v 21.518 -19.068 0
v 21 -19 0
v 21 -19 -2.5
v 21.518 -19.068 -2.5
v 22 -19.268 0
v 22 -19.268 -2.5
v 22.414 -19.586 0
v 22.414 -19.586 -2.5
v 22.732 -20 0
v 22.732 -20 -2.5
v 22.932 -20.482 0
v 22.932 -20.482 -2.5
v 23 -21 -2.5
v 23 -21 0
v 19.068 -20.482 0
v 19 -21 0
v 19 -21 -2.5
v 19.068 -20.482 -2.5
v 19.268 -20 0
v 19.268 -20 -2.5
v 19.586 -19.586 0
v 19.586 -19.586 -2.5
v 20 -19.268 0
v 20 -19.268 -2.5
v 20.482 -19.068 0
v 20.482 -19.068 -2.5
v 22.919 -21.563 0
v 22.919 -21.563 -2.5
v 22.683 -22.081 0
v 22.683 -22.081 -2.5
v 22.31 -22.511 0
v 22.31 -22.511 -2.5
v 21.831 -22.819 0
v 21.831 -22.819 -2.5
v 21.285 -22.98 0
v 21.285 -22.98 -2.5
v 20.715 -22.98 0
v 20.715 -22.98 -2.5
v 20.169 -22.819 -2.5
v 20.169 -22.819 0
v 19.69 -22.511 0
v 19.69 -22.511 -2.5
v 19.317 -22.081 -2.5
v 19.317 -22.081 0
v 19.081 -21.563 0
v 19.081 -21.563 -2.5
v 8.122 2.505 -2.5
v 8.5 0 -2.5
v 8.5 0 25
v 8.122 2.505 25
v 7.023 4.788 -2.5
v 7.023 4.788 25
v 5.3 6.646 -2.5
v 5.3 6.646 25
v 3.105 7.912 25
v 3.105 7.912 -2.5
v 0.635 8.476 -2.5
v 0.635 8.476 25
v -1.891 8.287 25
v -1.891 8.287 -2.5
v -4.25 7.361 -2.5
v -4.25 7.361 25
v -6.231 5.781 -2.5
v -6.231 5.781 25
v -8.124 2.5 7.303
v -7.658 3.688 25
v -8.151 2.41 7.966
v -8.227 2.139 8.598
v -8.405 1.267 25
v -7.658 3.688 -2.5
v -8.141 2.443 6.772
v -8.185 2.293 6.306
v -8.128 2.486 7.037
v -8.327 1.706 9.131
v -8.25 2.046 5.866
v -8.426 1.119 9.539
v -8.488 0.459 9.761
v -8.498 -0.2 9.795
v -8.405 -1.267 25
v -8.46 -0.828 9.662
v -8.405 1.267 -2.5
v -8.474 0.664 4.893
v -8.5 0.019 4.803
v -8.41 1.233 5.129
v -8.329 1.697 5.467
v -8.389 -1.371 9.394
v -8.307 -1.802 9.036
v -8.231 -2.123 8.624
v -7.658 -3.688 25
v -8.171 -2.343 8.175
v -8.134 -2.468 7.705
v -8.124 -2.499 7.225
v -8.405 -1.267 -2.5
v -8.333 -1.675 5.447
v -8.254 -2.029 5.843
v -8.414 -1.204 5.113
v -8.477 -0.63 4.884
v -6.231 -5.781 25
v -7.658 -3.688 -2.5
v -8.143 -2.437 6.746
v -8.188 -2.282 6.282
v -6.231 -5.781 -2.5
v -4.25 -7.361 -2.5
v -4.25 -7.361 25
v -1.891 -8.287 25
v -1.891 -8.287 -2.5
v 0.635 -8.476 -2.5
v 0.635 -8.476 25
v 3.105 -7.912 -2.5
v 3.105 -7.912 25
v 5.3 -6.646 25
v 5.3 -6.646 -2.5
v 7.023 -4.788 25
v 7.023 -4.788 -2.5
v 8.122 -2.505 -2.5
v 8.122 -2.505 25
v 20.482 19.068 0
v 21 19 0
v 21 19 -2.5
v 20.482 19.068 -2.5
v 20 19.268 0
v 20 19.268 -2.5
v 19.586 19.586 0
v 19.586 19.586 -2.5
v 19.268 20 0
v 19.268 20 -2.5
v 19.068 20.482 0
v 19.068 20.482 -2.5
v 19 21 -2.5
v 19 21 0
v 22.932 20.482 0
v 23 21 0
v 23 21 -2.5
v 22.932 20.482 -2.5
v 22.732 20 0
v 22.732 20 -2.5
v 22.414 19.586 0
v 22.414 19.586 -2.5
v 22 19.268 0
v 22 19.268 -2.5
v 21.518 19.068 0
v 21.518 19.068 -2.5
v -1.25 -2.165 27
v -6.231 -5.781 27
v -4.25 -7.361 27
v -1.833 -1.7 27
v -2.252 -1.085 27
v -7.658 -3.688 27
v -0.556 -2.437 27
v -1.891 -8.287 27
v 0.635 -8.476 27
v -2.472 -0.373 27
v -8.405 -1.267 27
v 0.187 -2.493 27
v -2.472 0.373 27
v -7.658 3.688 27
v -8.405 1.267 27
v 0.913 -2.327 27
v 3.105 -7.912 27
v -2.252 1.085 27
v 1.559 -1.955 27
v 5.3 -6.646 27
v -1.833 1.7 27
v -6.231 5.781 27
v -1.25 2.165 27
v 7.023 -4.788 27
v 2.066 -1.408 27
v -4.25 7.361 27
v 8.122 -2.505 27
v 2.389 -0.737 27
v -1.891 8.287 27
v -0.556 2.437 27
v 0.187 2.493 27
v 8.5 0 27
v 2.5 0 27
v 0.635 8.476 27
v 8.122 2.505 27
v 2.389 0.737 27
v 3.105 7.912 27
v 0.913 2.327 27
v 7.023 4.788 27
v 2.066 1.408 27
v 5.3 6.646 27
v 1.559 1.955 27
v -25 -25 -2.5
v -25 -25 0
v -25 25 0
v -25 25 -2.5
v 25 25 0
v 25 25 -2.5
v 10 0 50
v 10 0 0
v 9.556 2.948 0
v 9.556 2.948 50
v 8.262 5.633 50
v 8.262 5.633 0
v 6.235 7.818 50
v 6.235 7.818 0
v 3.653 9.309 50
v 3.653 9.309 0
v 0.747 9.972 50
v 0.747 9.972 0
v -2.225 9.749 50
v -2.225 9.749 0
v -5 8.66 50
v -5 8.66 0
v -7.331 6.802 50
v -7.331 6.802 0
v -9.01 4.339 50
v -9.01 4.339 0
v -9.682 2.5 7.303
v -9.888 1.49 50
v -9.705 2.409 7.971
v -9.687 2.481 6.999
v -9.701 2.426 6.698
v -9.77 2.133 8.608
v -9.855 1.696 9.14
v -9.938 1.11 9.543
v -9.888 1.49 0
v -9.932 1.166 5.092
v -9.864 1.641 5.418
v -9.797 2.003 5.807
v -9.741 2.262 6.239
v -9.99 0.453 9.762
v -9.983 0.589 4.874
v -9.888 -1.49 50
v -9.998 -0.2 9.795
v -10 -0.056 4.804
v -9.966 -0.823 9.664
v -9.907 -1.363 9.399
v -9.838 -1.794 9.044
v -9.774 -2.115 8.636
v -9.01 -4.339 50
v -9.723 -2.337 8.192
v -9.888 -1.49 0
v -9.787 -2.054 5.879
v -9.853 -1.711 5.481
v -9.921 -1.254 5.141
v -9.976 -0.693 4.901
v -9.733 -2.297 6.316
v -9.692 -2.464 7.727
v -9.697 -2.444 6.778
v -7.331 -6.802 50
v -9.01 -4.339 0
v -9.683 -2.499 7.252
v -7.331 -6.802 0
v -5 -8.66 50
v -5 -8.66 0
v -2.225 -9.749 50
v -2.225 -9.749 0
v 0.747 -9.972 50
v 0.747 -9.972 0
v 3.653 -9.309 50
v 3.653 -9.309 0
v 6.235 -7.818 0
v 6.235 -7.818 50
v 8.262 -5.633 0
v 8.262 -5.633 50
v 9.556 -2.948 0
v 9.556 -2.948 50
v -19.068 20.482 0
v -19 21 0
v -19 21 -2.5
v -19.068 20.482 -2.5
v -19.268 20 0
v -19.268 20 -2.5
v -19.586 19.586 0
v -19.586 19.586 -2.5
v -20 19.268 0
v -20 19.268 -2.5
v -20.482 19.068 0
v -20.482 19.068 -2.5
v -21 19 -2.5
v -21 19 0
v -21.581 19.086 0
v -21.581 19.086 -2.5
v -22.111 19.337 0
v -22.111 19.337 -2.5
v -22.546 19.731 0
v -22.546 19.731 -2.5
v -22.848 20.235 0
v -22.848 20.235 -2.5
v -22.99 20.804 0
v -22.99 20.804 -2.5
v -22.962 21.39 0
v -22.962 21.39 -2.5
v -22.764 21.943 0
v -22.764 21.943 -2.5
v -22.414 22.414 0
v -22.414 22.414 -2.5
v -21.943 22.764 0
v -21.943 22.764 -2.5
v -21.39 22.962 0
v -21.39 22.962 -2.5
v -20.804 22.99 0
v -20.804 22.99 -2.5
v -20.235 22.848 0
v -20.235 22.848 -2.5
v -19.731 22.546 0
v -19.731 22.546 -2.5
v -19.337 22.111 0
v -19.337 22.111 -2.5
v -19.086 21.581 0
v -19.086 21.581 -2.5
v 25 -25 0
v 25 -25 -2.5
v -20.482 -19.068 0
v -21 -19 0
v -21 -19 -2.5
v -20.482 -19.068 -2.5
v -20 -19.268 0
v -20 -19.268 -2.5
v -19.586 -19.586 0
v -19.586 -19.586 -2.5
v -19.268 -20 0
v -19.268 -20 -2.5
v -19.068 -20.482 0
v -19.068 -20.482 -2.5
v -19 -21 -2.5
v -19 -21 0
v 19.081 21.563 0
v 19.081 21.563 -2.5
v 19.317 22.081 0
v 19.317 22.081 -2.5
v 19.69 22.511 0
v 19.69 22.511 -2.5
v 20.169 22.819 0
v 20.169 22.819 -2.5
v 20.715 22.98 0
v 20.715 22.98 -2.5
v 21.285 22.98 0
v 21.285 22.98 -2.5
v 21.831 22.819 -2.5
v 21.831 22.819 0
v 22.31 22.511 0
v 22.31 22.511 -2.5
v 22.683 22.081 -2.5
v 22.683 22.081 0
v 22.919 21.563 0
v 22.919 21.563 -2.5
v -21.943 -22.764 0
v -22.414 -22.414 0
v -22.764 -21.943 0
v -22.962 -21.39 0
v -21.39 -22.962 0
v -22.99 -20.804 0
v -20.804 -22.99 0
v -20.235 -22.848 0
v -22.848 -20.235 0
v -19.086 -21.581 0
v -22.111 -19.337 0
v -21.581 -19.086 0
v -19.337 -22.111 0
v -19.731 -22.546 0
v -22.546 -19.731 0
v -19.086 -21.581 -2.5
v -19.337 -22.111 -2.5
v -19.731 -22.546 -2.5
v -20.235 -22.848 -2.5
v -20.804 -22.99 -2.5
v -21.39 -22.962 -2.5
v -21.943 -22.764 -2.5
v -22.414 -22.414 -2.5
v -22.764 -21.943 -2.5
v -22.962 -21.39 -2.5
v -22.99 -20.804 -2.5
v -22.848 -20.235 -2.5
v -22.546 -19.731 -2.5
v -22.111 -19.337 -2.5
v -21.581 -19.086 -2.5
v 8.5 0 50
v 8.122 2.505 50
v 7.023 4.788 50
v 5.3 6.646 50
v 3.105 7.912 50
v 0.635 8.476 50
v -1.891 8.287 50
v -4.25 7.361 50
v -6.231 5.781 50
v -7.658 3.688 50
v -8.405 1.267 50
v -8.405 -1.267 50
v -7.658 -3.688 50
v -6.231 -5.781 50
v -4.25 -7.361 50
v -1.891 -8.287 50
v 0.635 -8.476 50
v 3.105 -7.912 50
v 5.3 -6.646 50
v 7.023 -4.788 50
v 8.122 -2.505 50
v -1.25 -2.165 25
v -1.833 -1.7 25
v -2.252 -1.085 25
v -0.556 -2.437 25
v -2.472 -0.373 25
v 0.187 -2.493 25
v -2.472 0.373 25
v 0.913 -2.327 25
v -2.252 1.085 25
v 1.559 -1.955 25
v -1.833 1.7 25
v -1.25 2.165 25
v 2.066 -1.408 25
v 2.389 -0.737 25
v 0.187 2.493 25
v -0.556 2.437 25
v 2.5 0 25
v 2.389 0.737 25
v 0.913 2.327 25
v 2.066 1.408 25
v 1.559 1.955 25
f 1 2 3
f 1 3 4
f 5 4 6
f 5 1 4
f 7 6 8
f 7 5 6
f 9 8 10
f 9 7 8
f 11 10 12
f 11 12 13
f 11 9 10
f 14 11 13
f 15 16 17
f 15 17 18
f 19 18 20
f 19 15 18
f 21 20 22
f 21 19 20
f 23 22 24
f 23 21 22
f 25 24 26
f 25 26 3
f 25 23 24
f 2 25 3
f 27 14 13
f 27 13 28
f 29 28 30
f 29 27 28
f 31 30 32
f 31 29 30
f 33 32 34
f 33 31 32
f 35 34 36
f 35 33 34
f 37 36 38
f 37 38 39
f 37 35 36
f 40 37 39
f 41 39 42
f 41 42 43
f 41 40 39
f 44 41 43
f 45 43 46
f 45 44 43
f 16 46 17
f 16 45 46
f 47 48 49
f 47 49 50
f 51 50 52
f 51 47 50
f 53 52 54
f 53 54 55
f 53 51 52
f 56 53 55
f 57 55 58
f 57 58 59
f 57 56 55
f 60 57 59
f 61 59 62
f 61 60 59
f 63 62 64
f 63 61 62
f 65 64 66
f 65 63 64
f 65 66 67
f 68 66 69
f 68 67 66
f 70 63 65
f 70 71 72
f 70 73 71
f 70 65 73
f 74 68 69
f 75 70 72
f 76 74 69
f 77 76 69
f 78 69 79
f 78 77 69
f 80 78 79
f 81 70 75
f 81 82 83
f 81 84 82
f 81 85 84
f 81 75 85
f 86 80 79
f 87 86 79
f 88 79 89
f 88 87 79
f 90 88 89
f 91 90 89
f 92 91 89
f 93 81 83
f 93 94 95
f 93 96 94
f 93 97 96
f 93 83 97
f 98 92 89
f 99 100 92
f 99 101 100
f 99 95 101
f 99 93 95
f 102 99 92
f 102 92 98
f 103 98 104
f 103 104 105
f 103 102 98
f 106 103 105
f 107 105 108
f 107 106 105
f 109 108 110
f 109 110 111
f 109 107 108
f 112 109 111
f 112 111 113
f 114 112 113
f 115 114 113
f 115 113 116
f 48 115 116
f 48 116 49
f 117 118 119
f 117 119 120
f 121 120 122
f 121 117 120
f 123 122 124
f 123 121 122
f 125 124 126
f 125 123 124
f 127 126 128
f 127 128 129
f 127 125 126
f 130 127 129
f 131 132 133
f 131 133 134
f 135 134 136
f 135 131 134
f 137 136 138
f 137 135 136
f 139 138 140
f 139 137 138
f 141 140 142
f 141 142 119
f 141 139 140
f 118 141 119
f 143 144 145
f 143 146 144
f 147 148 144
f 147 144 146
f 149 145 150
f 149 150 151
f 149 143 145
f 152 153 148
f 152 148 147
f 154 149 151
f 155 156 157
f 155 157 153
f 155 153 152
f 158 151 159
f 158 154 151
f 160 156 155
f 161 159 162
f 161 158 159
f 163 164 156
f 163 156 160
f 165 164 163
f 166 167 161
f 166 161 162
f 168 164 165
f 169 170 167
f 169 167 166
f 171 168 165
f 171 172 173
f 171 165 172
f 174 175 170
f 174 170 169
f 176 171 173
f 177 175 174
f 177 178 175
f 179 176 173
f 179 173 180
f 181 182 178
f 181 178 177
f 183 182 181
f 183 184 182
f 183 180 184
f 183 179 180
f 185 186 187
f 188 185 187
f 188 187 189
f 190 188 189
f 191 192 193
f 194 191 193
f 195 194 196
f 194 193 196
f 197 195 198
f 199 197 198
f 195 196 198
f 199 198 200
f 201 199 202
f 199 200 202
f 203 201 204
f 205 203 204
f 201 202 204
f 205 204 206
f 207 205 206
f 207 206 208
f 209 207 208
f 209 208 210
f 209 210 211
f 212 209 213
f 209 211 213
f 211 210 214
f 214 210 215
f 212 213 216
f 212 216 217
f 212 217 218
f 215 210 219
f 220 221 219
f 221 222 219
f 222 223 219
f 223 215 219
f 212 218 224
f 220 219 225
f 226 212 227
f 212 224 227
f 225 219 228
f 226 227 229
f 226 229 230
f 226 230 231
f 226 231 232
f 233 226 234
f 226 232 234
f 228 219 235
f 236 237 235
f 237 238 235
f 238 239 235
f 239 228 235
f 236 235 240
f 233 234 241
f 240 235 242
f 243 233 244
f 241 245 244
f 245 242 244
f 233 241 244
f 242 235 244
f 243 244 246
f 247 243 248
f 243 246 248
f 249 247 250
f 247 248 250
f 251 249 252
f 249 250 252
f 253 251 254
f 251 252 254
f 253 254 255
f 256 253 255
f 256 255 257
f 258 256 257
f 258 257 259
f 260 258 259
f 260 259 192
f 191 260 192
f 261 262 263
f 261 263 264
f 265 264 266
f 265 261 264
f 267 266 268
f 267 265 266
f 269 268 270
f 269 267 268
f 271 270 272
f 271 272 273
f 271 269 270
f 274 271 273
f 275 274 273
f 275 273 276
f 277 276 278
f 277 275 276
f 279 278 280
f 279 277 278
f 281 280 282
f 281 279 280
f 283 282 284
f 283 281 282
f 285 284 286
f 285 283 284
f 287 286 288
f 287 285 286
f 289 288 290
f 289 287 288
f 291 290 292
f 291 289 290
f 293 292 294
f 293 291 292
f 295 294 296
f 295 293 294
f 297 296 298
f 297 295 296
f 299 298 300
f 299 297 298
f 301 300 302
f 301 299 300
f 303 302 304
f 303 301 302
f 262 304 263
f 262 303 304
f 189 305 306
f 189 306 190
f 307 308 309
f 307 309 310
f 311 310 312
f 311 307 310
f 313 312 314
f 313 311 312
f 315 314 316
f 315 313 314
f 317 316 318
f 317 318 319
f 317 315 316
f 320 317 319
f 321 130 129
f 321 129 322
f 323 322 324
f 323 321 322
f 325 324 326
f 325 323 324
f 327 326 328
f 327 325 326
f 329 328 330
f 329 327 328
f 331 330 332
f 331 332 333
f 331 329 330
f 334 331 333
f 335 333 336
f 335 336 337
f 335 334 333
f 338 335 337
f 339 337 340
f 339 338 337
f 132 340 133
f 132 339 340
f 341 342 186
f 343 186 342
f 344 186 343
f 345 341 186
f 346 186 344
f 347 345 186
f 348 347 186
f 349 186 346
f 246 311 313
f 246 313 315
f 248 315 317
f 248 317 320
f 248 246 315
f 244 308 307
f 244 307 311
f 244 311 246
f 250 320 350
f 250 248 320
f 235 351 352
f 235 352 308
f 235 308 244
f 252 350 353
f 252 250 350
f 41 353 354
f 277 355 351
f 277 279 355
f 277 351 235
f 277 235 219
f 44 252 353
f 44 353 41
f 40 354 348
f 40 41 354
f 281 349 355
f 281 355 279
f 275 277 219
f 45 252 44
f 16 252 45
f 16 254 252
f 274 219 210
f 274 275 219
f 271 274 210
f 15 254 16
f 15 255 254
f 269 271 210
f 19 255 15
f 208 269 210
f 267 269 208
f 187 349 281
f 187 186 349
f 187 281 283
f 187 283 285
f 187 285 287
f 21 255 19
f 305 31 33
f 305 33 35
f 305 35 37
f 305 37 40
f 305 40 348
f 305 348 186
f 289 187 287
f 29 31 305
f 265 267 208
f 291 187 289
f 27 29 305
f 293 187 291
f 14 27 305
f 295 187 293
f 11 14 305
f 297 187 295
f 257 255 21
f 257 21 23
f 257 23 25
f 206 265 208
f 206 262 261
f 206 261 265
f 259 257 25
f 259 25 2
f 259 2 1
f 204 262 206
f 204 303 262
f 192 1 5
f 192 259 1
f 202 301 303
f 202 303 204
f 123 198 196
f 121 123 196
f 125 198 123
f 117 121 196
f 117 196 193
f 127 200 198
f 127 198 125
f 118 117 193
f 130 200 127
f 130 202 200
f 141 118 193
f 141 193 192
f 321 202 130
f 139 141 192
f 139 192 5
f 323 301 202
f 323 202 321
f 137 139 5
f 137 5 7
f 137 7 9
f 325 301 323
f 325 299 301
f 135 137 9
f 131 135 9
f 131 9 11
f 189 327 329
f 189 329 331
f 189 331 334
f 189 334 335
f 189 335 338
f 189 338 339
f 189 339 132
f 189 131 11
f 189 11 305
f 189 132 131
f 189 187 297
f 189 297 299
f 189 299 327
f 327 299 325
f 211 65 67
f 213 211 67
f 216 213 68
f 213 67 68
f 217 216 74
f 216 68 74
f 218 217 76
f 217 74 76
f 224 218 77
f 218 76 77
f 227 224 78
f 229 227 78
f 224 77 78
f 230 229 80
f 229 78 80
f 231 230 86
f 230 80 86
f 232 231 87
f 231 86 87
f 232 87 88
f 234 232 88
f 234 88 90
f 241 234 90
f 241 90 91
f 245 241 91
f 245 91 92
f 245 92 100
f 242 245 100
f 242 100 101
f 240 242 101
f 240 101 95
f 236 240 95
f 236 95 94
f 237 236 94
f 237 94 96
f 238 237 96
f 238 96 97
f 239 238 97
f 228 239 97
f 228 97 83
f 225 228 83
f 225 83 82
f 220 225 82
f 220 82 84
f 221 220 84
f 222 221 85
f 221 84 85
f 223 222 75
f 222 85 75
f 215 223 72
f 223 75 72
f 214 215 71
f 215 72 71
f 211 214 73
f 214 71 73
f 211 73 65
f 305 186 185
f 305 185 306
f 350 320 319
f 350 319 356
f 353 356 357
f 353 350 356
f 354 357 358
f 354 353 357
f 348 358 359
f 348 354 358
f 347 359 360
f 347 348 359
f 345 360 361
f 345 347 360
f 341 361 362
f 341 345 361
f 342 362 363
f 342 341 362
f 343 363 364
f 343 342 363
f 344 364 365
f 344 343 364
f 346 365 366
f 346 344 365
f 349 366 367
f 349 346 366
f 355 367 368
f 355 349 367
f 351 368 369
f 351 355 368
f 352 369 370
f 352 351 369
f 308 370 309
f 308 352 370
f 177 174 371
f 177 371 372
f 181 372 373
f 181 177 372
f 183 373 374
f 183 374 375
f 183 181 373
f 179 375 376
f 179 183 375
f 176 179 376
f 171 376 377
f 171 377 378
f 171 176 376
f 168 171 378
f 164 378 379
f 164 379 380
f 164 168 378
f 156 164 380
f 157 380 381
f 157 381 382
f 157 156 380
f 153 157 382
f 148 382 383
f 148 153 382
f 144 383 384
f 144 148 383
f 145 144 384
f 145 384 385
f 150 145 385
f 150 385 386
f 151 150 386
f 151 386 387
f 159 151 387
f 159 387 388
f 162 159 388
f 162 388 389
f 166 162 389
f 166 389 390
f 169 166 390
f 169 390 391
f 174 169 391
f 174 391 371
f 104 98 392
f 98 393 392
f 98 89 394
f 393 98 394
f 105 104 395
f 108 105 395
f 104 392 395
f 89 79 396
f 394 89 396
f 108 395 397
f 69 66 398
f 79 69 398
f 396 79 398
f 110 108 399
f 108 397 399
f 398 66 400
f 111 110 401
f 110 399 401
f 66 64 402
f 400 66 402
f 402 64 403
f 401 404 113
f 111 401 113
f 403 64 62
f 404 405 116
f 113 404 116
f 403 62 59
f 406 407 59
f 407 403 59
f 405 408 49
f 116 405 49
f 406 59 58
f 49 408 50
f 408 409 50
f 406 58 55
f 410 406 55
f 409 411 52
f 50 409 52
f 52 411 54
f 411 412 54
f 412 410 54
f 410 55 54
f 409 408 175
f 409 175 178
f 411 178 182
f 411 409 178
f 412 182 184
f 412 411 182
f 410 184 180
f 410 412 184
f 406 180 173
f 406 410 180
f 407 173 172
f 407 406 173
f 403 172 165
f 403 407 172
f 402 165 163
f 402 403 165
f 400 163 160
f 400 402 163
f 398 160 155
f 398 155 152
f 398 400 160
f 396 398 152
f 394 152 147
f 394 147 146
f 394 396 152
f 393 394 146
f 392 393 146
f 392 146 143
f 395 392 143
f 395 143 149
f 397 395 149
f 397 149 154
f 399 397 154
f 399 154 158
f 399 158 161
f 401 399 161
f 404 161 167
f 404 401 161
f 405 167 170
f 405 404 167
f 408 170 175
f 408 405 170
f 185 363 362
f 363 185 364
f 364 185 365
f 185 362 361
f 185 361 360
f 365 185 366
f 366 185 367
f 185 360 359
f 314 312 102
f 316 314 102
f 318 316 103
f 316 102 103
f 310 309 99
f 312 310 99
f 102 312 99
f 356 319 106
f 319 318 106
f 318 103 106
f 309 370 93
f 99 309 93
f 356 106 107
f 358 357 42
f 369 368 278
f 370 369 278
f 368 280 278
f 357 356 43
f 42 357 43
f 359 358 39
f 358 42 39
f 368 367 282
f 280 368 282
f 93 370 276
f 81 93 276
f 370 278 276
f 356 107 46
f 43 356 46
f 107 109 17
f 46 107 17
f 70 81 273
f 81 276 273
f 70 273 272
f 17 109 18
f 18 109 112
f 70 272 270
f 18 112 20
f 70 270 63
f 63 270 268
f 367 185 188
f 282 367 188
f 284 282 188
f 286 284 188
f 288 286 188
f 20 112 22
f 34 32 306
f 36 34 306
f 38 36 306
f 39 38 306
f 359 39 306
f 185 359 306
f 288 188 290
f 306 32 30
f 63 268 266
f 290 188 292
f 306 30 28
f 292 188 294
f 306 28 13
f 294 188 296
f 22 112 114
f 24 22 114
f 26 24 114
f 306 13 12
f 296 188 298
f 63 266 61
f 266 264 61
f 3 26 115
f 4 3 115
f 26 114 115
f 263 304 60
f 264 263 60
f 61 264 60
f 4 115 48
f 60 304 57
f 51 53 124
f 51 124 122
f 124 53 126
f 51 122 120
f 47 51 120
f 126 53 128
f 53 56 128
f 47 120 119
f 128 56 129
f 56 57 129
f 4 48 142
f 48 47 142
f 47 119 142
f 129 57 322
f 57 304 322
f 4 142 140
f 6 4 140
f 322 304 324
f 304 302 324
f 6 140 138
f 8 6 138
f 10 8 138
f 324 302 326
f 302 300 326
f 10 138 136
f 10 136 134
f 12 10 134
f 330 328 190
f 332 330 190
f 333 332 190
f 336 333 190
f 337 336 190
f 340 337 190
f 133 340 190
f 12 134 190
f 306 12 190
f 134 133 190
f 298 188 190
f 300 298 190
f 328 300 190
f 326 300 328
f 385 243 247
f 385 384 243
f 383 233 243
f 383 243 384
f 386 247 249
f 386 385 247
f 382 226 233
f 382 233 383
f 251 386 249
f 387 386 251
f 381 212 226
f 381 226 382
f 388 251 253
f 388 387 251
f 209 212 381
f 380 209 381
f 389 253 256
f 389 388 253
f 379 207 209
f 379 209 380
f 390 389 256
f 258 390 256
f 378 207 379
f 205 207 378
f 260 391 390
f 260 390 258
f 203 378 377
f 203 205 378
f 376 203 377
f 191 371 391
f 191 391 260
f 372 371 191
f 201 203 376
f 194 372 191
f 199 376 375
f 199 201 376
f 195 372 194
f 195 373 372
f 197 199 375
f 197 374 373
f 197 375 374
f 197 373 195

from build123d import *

# Parameters (mm, degrees)
F0_W     = 50
F0_H     = 50
F0_R     = 10
F0_R_2   = 8.5
F1_DEPTH = 2.5
F2_DEPTH = 25
F4_R     = 8.5
F4_R_2   = 2.5
F5_DEPTH = 2
F4_R_3   = 10
F6_DEPTH = 25
F7_R     = 2.5
F8_DEPTH = 25


with BuildPart() as f1:
    # F0 (on Top) → F1 (new body)
    with BuildSketch(Plane.XY):
        Rectangle(F0_W, F0_H)
        with BuildLine():
            ThreePointArc((-21, 19), (-22.414214, 22.414214), (-19, 21))
            Line((-19, 21), (19, 21))
            ThreePointArc((19, 21), (21, 23), (23, 21))
            ThreePointArc((23, 21), (22.414214, 19.585786), (21, 19))
            Line((21, 19), (21, -19))
            ThreePointArc((21, -19), (22.414214, -19.585786), (23, -21))
            ThreePointArc((23, -21), (21, -23), (19, -21))
            Line((19, -21), (-19, -21))
            ThreePointArc((-19, -21), (-22.414214, -22.414214), (-21, -19))
            Line((-21, -19), (-21, 19))
        make_face(mode=Mode.SUBTRACT)
        with BuildLine():
            Line((19, 21), (-19, 21))
            ThreePointArc((-19, 21), (-19.585786, 19.585786), (-21, 19))
            Line((-21, 19), (-21, -19))
            ThreePointArc((-21, -19), (-19.585786, -19.585786), (-19, -21))
            Line((-19, -21), (19, -21))
            ThreePointArc((19, -21), (19.585786, -19.585786), (21, -19))
            Line((21, -19), (21, 19))
            ThreePointArc((21, 19), (19.585786, 19.585786), (19, 21))
        make_face()
        Circle(F0_R, mode=Mode.SUBTRACT)
        Circle(F0_R)
        Circle(F0_R_2, mode=Mode.SUBTRACT)
    extrude(amount=-F1_DEPTH)

    # F0 (on Top) → F2 (join)
    with BuildSketch(Plane.XY):
        Circle(F0_R)
        Circle(F0_R_2, mode=Mode.SUBTRACT)
    extrude(amount=F2_DEPTH)

    # F4 (on offset) → F5 (join)
    with BuildSketch(Plane.XY.offset(25)):
        Circle(F4_R)
        Circle(F4_R_2, mode=Mode.SUBTRACT)
    extrude(amount=F5_DEPTH)

    # F4 (on offset) → F6 (join)
    with BuildSketch(Plane.XY.offset(25)):
        Circle(F4_R_3)
        Circle(F4_R, mode=Mode.SUBTRACT)
    extrude(amount=F6_DEPTH)

    # F7 (on Right) → F8 (cut)
    with BuildSketch(Plane.YZ):
        with Locations((0, 7.303349)):
            Circle(F7_R)
    extrude(amount=-F8_DEPTH, mode=Mode.SUBTRACT)


solid = f1.part
